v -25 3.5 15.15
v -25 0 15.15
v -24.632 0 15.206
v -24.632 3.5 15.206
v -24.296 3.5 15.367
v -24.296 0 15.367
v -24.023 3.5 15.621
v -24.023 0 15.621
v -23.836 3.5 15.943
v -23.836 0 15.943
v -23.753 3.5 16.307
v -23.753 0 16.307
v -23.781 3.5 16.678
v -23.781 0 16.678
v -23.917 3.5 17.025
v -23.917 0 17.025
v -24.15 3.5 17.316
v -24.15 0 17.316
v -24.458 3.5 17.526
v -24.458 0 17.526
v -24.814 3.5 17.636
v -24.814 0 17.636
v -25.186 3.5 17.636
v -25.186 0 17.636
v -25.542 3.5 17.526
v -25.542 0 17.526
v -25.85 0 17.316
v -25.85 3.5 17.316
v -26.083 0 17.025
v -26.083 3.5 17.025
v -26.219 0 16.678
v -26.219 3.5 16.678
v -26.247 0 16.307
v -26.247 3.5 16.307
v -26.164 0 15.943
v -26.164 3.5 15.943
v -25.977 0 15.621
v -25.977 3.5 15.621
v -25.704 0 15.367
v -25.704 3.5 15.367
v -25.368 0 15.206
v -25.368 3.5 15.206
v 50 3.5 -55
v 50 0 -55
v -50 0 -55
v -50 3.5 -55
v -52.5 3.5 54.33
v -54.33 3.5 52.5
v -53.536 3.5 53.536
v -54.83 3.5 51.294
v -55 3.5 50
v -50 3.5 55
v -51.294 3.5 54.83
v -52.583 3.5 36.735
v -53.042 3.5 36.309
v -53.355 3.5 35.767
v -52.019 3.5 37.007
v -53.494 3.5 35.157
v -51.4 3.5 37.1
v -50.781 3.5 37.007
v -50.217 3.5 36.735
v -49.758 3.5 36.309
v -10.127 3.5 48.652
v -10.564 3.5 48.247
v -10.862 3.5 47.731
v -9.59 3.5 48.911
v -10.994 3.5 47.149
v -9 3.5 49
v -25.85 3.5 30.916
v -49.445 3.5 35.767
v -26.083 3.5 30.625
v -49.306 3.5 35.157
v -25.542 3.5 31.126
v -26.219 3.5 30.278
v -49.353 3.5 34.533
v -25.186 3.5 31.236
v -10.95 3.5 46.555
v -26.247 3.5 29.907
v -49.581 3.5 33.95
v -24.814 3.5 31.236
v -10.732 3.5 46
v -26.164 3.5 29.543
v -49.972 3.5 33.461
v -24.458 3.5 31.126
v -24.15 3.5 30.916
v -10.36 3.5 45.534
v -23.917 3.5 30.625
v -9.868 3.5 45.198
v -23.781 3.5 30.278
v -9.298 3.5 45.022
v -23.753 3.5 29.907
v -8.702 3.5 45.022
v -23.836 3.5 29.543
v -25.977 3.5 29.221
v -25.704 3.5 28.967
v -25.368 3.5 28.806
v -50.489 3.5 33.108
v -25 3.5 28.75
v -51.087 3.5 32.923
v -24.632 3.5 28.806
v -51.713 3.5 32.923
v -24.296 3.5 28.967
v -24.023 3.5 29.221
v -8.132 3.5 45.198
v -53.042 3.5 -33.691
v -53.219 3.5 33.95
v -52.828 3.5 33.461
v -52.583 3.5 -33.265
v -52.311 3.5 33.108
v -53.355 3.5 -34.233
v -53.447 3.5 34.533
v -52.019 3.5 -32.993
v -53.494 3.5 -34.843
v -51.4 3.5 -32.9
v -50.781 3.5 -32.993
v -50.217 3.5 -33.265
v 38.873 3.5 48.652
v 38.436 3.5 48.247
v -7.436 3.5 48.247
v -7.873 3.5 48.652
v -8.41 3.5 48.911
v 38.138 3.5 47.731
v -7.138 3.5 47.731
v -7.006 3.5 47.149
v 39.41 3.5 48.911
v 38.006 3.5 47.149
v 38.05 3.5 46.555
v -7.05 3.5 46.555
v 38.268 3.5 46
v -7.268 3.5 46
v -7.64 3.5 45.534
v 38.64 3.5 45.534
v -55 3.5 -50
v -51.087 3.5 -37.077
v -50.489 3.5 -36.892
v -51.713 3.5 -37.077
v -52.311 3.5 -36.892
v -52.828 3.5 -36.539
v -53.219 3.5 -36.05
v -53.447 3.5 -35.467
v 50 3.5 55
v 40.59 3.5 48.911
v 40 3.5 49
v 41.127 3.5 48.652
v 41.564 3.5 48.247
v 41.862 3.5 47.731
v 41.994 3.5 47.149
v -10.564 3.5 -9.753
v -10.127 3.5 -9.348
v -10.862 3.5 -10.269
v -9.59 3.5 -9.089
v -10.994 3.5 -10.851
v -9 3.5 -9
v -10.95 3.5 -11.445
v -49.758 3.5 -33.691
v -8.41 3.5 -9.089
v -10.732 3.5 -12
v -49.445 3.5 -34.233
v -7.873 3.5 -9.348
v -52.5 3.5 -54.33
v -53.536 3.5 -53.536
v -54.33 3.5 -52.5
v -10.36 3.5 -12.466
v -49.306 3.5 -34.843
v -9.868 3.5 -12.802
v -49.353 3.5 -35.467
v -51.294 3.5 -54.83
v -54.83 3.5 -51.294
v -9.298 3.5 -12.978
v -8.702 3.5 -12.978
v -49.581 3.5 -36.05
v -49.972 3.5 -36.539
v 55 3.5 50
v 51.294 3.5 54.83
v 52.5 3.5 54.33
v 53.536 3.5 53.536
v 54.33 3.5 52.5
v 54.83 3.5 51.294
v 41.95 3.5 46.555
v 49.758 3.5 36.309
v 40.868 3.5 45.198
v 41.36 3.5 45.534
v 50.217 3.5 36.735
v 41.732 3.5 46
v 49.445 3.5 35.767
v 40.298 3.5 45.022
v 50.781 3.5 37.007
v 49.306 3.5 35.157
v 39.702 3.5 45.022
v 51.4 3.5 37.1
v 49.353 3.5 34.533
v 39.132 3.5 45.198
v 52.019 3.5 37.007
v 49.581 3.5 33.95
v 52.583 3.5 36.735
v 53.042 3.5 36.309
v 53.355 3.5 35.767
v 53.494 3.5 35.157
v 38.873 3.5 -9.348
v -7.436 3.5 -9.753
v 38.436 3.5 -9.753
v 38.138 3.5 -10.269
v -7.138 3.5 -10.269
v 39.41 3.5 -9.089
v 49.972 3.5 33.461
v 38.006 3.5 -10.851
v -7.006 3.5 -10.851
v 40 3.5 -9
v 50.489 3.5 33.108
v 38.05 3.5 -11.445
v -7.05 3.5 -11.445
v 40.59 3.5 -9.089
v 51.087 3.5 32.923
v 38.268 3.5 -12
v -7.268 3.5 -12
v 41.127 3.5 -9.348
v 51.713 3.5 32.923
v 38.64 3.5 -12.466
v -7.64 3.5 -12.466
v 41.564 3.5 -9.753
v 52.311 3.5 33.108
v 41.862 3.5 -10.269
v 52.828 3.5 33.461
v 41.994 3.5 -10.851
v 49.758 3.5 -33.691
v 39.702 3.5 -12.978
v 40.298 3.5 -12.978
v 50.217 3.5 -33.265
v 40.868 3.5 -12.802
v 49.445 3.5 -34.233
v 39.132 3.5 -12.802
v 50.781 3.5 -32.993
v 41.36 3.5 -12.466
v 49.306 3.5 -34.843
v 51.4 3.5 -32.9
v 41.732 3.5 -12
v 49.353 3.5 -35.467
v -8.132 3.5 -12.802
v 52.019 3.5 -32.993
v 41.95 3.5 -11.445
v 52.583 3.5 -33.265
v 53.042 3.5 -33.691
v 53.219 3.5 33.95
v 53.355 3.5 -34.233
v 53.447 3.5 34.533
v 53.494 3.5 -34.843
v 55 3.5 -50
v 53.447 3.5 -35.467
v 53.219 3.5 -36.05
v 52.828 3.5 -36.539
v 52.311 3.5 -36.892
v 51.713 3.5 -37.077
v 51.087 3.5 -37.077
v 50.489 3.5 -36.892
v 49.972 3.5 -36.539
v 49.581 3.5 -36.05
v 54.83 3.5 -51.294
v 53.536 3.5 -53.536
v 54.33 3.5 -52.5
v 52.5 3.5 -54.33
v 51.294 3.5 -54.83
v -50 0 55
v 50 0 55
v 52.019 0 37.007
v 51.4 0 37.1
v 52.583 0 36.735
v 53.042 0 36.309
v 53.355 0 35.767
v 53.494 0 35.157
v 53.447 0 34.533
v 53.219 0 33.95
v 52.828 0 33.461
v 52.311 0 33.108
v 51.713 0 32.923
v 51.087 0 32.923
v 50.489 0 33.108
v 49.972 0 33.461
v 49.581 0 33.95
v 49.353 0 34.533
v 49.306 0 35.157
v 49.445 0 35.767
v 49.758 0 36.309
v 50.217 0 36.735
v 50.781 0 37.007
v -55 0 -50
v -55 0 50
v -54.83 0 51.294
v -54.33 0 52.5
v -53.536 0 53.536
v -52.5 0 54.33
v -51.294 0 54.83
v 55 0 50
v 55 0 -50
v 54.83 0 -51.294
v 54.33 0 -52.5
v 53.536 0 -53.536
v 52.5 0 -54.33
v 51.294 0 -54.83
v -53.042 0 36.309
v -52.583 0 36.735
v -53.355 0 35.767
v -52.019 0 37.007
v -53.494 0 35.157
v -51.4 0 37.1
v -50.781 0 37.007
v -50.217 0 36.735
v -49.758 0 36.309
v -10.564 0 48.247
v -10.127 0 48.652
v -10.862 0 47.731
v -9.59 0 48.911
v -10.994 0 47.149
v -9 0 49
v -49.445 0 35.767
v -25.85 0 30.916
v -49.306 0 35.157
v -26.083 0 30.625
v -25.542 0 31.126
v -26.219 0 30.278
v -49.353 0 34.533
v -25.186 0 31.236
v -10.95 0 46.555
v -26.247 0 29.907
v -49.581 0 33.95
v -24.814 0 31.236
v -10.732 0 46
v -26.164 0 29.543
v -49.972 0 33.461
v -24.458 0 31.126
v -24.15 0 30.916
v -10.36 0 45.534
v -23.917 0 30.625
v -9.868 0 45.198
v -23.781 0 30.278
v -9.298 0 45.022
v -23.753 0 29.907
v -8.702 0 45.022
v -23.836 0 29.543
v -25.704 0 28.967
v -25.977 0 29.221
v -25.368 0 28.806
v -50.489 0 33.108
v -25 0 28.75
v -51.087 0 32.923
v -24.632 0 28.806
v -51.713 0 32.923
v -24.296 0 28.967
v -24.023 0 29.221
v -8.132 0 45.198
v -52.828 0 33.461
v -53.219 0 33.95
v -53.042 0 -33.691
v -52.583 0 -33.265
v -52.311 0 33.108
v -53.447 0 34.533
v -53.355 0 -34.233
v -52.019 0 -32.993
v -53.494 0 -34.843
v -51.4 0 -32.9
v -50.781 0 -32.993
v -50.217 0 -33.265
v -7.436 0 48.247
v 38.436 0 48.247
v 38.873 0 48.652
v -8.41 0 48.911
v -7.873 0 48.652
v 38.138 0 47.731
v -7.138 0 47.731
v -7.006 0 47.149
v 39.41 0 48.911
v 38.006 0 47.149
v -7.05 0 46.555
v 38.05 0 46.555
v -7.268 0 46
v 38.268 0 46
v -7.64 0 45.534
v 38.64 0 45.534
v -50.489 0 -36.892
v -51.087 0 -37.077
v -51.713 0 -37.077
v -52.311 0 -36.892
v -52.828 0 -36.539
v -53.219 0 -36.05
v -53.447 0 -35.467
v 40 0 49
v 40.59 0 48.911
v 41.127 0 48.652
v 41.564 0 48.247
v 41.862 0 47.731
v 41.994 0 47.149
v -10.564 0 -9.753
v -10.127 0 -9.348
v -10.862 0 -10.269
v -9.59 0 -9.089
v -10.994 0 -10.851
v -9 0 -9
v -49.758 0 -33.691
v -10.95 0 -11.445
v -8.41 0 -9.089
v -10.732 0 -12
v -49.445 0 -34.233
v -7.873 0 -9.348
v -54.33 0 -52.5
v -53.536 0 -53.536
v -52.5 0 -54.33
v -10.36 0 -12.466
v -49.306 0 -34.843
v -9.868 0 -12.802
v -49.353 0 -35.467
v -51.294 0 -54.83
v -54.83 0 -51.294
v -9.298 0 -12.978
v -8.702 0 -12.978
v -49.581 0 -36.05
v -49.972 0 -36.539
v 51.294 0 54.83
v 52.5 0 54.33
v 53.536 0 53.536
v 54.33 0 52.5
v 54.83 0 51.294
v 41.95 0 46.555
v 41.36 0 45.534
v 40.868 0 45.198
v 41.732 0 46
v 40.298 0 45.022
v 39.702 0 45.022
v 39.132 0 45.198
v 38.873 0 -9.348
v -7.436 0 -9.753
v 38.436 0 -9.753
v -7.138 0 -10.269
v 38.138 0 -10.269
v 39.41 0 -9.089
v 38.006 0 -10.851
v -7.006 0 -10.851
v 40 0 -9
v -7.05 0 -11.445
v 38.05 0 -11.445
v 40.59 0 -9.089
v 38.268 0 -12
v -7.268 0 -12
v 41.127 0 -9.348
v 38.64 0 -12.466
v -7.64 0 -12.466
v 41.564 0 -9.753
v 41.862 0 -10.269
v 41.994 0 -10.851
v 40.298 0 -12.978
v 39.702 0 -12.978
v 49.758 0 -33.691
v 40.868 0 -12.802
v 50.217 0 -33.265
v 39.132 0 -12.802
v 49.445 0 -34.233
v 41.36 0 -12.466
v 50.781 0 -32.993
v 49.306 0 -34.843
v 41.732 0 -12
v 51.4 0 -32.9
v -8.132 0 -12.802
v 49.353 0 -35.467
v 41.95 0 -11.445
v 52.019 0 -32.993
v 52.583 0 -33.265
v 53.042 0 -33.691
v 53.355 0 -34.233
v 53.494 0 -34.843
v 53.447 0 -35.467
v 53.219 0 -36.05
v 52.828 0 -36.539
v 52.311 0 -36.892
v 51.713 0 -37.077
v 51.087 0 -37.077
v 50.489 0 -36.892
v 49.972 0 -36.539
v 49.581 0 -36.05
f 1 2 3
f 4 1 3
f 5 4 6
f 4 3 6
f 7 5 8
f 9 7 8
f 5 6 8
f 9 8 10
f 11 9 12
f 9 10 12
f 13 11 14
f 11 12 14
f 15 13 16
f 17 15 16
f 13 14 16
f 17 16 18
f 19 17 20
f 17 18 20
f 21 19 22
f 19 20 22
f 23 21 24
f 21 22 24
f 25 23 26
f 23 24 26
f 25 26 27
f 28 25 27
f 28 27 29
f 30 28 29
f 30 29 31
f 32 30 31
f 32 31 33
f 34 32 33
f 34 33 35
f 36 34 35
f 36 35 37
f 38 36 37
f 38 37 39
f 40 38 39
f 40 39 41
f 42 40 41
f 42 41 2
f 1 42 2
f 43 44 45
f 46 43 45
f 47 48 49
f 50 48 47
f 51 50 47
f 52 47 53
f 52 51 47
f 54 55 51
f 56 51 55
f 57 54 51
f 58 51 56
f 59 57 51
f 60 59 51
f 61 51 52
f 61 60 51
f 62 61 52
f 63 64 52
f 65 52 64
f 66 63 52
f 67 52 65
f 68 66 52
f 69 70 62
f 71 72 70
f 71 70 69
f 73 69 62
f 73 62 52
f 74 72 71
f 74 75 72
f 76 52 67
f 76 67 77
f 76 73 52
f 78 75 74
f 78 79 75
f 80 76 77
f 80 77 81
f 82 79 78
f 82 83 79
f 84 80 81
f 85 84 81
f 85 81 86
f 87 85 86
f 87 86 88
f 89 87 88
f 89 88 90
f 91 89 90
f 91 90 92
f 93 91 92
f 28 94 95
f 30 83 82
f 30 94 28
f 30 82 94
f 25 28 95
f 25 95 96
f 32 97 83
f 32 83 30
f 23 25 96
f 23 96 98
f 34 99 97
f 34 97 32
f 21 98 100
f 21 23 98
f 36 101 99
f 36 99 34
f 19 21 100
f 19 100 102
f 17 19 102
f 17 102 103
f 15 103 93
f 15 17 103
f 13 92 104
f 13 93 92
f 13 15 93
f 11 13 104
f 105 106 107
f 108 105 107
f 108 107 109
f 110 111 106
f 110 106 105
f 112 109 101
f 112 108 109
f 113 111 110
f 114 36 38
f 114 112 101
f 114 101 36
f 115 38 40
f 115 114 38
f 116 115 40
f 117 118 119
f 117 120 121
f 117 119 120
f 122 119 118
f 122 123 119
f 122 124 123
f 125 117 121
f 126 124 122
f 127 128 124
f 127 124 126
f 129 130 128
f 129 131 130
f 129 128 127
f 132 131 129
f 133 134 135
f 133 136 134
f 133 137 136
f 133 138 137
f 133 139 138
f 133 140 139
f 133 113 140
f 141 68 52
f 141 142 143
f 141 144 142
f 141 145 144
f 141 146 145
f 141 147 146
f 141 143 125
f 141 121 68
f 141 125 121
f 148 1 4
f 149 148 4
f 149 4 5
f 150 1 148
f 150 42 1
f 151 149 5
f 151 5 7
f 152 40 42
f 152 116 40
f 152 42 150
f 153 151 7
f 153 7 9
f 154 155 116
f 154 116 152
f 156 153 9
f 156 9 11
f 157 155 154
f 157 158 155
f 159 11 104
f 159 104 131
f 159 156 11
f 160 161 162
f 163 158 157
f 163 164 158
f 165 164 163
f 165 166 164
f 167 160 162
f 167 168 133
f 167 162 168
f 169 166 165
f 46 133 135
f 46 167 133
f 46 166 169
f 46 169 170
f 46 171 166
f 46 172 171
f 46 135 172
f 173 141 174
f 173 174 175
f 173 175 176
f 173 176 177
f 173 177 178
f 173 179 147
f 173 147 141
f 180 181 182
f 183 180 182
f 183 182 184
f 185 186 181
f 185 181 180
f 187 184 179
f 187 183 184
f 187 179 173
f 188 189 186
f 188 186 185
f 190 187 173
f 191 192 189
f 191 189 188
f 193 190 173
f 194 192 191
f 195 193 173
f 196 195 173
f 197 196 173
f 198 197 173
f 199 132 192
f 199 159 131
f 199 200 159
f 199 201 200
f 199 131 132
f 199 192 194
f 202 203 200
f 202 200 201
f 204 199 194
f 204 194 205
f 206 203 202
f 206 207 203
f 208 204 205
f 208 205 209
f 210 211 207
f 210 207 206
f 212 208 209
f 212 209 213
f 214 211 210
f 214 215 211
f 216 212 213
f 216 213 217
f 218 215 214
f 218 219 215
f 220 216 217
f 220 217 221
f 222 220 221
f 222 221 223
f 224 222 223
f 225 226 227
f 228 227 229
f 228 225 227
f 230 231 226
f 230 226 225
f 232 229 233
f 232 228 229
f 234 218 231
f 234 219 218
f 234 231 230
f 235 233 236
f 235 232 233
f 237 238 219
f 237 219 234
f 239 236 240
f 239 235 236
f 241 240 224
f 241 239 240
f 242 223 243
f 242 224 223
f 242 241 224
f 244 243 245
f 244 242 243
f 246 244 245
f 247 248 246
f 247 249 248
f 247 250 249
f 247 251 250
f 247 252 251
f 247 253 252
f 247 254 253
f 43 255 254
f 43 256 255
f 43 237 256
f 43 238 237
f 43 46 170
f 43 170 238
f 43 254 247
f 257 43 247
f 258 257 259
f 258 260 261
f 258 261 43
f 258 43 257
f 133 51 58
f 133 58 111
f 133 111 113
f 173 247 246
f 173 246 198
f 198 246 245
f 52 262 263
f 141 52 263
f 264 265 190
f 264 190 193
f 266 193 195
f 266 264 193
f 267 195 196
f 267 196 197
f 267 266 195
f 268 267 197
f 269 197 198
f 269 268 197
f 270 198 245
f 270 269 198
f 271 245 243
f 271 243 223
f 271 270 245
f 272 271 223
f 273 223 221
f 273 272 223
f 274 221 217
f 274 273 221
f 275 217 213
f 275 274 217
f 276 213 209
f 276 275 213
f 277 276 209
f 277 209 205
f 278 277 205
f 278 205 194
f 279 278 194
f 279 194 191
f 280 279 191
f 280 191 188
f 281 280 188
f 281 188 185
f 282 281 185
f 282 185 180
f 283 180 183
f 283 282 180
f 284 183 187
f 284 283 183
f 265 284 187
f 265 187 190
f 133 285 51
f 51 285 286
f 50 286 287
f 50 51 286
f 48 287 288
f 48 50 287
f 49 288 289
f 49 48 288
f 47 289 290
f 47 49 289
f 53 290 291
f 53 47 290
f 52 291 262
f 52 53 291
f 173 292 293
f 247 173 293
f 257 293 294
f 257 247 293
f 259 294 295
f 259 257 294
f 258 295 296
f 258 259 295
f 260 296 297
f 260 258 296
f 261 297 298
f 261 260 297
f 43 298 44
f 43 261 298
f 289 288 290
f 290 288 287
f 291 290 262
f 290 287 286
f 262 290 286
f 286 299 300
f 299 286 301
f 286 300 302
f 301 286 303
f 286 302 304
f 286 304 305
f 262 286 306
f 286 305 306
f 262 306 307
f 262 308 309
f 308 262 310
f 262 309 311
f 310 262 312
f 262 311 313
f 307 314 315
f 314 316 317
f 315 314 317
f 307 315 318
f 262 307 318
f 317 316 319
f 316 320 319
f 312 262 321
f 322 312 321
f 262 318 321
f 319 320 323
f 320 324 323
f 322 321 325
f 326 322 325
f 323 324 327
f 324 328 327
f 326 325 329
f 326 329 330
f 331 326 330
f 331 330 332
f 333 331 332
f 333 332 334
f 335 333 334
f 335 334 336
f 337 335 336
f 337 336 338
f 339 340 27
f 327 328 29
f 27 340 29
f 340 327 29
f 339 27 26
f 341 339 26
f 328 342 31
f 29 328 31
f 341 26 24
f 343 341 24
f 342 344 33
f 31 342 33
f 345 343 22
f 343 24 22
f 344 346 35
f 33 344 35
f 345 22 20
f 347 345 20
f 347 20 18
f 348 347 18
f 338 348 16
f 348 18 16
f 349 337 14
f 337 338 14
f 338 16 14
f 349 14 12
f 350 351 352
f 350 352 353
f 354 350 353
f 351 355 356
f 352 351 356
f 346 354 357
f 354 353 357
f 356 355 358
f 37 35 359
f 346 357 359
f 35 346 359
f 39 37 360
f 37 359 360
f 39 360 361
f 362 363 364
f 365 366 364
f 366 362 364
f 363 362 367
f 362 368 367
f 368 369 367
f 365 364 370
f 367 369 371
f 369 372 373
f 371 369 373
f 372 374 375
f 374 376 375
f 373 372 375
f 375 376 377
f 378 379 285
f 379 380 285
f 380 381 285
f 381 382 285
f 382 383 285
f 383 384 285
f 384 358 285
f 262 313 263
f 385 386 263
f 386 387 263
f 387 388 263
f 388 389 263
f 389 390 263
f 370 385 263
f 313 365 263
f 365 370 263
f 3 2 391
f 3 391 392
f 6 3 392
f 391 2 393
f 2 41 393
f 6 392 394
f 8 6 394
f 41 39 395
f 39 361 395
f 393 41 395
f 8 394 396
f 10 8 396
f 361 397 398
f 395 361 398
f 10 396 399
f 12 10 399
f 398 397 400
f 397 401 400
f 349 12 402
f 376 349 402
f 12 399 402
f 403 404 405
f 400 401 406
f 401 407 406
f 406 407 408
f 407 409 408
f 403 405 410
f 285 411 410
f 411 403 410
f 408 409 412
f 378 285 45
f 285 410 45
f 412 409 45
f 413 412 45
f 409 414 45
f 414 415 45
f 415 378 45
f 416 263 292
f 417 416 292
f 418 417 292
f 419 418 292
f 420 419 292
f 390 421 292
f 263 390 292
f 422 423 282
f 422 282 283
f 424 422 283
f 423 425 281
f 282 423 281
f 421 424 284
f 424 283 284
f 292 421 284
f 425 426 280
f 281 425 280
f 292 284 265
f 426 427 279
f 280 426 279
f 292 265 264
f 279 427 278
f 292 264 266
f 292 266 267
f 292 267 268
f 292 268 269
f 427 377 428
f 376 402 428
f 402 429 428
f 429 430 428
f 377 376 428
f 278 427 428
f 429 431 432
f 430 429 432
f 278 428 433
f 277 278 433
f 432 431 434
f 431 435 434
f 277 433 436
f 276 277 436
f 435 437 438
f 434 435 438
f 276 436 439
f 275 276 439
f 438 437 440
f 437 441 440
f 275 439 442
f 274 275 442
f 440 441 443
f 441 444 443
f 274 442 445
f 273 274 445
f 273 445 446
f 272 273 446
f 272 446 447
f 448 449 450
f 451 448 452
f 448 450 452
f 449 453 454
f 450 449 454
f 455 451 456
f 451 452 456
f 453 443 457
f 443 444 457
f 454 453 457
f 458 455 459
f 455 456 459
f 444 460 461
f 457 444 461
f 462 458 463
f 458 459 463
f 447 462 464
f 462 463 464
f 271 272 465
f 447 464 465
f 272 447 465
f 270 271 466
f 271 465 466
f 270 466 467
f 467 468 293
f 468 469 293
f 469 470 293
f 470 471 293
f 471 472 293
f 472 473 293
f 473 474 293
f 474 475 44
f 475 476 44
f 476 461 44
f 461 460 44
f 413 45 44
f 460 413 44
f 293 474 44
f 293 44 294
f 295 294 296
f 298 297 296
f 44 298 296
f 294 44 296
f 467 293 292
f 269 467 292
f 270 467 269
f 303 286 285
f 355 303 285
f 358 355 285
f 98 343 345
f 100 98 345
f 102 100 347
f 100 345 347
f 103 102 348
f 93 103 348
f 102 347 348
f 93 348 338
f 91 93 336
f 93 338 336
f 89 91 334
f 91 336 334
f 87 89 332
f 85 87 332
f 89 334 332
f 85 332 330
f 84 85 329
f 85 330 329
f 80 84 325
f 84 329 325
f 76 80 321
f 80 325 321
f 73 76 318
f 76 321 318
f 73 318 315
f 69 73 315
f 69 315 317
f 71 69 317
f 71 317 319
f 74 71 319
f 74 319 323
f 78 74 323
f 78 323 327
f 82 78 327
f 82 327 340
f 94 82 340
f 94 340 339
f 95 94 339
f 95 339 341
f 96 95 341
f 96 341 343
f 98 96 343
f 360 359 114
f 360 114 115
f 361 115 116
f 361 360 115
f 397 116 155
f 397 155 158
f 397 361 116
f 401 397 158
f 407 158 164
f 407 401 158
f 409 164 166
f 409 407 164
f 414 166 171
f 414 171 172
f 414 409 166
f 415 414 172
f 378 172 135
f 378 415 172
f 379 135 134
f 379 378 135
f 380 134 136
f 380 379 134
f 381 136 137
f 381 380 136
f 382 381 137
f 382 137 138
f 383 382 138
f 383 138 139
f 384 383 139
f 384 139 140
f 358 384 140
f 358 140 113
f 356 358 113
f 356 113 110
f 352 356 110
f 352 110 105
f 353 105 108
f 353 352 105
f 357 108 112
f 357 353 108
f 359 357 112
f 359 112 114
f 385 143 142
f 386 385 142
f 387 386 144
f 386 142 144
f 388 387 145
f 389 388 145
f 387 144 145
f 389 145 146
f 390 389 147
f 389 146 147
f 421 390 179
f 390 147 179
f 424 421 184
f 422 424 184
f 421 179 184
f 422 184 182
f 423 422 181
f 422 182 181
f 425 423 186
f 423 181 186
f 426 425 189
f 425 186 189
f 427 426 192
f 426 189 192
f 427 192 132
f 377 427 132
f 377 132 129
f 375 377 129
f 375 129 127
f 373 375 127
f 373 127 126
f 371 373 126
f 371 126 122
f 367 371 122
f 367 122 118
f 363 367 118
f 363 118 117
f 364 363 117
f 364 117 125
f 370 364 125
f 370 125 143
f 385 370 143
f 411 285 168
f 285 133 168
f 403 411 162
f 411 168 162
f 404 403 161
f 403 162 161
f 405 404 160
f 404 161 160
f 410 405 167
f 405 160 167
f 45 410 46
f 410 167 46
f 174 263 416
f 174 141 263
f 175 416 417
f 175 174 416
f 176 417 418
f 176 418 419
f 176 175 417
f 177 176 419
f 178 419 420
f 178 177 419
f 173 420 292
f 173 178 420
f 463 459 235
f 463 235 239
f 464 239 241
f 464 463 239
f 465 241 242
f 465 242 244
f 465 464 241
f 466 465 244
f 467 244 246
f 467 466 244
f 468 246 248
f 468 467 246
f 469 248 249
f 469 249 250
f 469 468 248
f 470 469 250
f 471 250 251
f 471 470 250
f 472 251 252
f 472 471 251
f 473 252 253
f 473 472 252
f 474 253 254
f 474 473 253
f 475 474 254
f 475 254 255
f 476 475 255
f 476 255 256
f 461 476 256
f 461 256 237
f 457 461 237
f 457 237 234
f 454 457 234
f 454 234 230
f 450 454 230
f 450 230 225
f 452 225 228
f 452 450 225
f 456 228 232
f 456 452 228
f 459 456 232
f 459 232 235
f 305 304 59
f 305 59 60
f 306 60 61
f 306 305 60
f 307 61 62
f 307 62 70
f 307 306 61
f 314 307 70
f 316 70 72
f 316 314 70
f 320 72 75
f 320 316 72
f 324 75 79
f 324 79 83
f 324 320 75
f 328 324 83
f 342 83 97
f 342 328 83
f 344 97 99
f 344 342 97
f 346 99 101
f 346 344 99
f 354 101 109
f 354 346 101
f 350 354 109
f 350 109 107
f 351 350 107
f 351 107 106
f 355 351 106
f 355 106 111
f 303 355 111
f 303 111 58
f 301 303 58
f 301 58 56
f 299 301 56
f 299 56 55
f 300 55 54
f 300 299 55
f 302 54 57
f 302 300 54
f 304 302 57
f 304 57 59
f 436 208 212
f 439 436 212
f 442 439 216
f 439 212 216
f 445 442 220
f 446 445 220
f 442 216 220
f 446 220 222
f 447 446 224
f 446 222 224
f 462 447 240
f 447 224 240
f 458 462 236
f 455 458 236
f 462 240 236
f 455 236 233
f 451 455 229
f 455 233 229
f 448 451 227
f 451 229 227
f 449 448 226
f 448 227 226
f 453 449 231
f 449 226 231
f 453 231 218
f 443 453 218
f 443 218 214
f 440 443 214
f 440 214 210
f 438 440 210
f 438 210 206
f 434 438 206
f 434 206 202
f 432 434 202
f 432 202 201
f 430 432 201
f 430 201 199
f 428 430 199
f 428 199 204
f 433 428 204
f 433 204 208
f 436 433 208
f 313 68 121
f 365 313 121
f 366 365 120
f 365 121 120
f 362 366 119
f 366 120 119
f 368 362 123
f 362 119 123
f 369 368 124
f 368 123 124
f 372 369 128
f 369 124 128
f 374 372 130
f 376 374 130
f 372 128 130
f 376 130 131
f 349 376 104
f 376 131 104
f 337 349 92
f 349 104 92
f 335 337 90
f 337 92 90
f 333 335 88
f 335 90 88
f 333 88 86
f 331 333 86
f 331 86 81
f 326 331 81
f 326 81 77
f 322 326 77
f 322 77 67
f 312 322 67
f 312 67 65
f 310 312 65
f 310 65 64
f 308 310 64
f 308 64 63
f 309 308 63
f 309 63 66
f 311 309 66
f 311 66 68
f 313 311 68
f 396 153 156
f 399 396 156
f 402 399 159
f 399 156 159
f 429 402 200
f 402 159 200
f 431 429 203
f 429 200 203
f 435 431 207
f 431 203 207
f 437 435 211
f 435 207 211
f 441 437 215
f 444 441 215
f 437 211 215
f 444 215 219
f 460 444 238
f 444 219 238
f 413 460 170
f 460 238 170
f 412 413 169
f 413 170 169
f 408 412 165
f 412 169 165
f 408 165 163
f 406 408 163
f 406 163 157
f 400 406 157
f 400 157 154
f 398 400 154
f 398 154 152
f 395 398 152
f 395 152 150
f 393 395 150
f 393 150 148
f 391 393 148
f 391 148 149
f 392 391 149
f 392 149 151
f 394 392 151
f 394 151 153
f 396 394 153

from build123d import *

# Parameters (mm, degrees)
ESQUISSE1_R        = 2.1
BOSS_EXTRU_1_DEPTH = 3.5
CONG_1_R           = 5
ESQUISSE3_R        = 2
TROUS_RPI_DEPTH    = 78.860452092
ESQUISSE5_R        = 1.25
TROUS_ICM_DEPTH    = 78.860452092


with BuildPart() as part:
    # Esquisse1 → Boss.-Extru.1 (new body)
    # profile 1 of 2: a face of its own
    with BuildSketch(Plane(origin=(0, 0, 0), x_dir=(1, 0, 0), z_dir=(0, 1, 0))):
        with BuildLine():
            Line((-55, 31.4), (-55, -55))
            Line((-55, -55), (55, -55))
            Line((55, -55), (55, 55))
            Line((55, 55), (-55, 55))
            Line((-55, 55), (-55, 38.6))
            Line((-55, 38.6), (-51.4, 38.6))
            ThreePointArc((-51.4, 38.6), (-47.8, 35), (-51.4, 31.4))
            Line((-51.4, 31.4), (-55, 31.4))
        make_face()
        with Locations(Location((-51.4, -35, 0), (0, 0, 270))):
            Circle(ESQUISSE1_R, mode=Mode.SUBTRACT)
        with Locations(Location((51.4, -35, 0), (0, 0, 270))):
            Circle(ESQUISSE1_R, mode=Mode.SUBTRACT)
        with Locations(Location((51.4, 35, 0), (0, 0, 270))):
            Circle(ESQUISSE1_R, mode=Mode.SUBTRACT)
    # profile 2 of 2: a face of its own
    with BuildSketch(Plane(origin=(0, 0, 0), x_dir=(1, 0, 0), z_dir=(0, 1, 0))):
        with BuildLine():
            Line((-55, 38.6), (-55, 31.4))
            Line((-55, 31.4), (-51.4, 31.4))
            ThreePointArc((-51.4, 31.4), (-47.8, 35), (-51.4, 38.6))
            Line((-51.4, 38.6), (-55, 38.6))
        make_face()
        with Locations(Location((-51.4, 35, 0), (0, 0, 270))):
            Circle(ESQUISSE1_R, mode=Mode.SUBTRACT)
    extrude(amount=BOSS_EXTRU_1_DEPTH)

    # Congé1
    cong_1_edges = [part.edges().sort_by_distance(p)[0] for p in [
        (55, 1.75, -55),
        (55, 1.75, 55),
        (-55, 1.75, 55),
        (-55, 1.75, -55),
    ]]
    fillet(cong_1_edges, radius=CONG_1_R)

    # Esquisse3 → Trous RPI (cut, through all)
    with BuildSketch(Plane(origin=(0, 3.5, 0), x_dir=(1, 0, 0), z_dir=(0, 1, 0))):
        with Locations(Location((40, 11, 0), (0, 0, 270))):
            Circle(ESQUISSE3_R)
        with Locations(Location((40, -47, 0), (0, 0, 270))):
            Circle(ESQUISSE3_R)
        with Locations(Location((-9, -47, 0), (0, 0, 270))):
            Circle(ESQUISSE3_R)
        with Locations(Location((-9, 11, 0), (0, 0, 270))):
            Circle(ESQUISSE3_R)
    extrude(amount=-TROUS_RPI_DEPTH, mode=Mode.SUBTRACT)

    # Esquisse5 → Trous ICM (cut, through all)
    with BuildSketch(Plane(origin=(0, 0, 0), x_dir=(-1, 0, 0), z_dir=(0, -1, 0))):
        with Locations(Location((25, -30, 0), (0, 0, 90))):
            Circle(ESQUISSE5_R)
        with Locations(Location((25, -16.4, 0), (0, 0, 90))):
            Circle(ESQUISSE5_R)
    extrude(amount=-TROUS_ICM_DEPTH, mode=Mode.SUBTRACT)


solid = part.part
